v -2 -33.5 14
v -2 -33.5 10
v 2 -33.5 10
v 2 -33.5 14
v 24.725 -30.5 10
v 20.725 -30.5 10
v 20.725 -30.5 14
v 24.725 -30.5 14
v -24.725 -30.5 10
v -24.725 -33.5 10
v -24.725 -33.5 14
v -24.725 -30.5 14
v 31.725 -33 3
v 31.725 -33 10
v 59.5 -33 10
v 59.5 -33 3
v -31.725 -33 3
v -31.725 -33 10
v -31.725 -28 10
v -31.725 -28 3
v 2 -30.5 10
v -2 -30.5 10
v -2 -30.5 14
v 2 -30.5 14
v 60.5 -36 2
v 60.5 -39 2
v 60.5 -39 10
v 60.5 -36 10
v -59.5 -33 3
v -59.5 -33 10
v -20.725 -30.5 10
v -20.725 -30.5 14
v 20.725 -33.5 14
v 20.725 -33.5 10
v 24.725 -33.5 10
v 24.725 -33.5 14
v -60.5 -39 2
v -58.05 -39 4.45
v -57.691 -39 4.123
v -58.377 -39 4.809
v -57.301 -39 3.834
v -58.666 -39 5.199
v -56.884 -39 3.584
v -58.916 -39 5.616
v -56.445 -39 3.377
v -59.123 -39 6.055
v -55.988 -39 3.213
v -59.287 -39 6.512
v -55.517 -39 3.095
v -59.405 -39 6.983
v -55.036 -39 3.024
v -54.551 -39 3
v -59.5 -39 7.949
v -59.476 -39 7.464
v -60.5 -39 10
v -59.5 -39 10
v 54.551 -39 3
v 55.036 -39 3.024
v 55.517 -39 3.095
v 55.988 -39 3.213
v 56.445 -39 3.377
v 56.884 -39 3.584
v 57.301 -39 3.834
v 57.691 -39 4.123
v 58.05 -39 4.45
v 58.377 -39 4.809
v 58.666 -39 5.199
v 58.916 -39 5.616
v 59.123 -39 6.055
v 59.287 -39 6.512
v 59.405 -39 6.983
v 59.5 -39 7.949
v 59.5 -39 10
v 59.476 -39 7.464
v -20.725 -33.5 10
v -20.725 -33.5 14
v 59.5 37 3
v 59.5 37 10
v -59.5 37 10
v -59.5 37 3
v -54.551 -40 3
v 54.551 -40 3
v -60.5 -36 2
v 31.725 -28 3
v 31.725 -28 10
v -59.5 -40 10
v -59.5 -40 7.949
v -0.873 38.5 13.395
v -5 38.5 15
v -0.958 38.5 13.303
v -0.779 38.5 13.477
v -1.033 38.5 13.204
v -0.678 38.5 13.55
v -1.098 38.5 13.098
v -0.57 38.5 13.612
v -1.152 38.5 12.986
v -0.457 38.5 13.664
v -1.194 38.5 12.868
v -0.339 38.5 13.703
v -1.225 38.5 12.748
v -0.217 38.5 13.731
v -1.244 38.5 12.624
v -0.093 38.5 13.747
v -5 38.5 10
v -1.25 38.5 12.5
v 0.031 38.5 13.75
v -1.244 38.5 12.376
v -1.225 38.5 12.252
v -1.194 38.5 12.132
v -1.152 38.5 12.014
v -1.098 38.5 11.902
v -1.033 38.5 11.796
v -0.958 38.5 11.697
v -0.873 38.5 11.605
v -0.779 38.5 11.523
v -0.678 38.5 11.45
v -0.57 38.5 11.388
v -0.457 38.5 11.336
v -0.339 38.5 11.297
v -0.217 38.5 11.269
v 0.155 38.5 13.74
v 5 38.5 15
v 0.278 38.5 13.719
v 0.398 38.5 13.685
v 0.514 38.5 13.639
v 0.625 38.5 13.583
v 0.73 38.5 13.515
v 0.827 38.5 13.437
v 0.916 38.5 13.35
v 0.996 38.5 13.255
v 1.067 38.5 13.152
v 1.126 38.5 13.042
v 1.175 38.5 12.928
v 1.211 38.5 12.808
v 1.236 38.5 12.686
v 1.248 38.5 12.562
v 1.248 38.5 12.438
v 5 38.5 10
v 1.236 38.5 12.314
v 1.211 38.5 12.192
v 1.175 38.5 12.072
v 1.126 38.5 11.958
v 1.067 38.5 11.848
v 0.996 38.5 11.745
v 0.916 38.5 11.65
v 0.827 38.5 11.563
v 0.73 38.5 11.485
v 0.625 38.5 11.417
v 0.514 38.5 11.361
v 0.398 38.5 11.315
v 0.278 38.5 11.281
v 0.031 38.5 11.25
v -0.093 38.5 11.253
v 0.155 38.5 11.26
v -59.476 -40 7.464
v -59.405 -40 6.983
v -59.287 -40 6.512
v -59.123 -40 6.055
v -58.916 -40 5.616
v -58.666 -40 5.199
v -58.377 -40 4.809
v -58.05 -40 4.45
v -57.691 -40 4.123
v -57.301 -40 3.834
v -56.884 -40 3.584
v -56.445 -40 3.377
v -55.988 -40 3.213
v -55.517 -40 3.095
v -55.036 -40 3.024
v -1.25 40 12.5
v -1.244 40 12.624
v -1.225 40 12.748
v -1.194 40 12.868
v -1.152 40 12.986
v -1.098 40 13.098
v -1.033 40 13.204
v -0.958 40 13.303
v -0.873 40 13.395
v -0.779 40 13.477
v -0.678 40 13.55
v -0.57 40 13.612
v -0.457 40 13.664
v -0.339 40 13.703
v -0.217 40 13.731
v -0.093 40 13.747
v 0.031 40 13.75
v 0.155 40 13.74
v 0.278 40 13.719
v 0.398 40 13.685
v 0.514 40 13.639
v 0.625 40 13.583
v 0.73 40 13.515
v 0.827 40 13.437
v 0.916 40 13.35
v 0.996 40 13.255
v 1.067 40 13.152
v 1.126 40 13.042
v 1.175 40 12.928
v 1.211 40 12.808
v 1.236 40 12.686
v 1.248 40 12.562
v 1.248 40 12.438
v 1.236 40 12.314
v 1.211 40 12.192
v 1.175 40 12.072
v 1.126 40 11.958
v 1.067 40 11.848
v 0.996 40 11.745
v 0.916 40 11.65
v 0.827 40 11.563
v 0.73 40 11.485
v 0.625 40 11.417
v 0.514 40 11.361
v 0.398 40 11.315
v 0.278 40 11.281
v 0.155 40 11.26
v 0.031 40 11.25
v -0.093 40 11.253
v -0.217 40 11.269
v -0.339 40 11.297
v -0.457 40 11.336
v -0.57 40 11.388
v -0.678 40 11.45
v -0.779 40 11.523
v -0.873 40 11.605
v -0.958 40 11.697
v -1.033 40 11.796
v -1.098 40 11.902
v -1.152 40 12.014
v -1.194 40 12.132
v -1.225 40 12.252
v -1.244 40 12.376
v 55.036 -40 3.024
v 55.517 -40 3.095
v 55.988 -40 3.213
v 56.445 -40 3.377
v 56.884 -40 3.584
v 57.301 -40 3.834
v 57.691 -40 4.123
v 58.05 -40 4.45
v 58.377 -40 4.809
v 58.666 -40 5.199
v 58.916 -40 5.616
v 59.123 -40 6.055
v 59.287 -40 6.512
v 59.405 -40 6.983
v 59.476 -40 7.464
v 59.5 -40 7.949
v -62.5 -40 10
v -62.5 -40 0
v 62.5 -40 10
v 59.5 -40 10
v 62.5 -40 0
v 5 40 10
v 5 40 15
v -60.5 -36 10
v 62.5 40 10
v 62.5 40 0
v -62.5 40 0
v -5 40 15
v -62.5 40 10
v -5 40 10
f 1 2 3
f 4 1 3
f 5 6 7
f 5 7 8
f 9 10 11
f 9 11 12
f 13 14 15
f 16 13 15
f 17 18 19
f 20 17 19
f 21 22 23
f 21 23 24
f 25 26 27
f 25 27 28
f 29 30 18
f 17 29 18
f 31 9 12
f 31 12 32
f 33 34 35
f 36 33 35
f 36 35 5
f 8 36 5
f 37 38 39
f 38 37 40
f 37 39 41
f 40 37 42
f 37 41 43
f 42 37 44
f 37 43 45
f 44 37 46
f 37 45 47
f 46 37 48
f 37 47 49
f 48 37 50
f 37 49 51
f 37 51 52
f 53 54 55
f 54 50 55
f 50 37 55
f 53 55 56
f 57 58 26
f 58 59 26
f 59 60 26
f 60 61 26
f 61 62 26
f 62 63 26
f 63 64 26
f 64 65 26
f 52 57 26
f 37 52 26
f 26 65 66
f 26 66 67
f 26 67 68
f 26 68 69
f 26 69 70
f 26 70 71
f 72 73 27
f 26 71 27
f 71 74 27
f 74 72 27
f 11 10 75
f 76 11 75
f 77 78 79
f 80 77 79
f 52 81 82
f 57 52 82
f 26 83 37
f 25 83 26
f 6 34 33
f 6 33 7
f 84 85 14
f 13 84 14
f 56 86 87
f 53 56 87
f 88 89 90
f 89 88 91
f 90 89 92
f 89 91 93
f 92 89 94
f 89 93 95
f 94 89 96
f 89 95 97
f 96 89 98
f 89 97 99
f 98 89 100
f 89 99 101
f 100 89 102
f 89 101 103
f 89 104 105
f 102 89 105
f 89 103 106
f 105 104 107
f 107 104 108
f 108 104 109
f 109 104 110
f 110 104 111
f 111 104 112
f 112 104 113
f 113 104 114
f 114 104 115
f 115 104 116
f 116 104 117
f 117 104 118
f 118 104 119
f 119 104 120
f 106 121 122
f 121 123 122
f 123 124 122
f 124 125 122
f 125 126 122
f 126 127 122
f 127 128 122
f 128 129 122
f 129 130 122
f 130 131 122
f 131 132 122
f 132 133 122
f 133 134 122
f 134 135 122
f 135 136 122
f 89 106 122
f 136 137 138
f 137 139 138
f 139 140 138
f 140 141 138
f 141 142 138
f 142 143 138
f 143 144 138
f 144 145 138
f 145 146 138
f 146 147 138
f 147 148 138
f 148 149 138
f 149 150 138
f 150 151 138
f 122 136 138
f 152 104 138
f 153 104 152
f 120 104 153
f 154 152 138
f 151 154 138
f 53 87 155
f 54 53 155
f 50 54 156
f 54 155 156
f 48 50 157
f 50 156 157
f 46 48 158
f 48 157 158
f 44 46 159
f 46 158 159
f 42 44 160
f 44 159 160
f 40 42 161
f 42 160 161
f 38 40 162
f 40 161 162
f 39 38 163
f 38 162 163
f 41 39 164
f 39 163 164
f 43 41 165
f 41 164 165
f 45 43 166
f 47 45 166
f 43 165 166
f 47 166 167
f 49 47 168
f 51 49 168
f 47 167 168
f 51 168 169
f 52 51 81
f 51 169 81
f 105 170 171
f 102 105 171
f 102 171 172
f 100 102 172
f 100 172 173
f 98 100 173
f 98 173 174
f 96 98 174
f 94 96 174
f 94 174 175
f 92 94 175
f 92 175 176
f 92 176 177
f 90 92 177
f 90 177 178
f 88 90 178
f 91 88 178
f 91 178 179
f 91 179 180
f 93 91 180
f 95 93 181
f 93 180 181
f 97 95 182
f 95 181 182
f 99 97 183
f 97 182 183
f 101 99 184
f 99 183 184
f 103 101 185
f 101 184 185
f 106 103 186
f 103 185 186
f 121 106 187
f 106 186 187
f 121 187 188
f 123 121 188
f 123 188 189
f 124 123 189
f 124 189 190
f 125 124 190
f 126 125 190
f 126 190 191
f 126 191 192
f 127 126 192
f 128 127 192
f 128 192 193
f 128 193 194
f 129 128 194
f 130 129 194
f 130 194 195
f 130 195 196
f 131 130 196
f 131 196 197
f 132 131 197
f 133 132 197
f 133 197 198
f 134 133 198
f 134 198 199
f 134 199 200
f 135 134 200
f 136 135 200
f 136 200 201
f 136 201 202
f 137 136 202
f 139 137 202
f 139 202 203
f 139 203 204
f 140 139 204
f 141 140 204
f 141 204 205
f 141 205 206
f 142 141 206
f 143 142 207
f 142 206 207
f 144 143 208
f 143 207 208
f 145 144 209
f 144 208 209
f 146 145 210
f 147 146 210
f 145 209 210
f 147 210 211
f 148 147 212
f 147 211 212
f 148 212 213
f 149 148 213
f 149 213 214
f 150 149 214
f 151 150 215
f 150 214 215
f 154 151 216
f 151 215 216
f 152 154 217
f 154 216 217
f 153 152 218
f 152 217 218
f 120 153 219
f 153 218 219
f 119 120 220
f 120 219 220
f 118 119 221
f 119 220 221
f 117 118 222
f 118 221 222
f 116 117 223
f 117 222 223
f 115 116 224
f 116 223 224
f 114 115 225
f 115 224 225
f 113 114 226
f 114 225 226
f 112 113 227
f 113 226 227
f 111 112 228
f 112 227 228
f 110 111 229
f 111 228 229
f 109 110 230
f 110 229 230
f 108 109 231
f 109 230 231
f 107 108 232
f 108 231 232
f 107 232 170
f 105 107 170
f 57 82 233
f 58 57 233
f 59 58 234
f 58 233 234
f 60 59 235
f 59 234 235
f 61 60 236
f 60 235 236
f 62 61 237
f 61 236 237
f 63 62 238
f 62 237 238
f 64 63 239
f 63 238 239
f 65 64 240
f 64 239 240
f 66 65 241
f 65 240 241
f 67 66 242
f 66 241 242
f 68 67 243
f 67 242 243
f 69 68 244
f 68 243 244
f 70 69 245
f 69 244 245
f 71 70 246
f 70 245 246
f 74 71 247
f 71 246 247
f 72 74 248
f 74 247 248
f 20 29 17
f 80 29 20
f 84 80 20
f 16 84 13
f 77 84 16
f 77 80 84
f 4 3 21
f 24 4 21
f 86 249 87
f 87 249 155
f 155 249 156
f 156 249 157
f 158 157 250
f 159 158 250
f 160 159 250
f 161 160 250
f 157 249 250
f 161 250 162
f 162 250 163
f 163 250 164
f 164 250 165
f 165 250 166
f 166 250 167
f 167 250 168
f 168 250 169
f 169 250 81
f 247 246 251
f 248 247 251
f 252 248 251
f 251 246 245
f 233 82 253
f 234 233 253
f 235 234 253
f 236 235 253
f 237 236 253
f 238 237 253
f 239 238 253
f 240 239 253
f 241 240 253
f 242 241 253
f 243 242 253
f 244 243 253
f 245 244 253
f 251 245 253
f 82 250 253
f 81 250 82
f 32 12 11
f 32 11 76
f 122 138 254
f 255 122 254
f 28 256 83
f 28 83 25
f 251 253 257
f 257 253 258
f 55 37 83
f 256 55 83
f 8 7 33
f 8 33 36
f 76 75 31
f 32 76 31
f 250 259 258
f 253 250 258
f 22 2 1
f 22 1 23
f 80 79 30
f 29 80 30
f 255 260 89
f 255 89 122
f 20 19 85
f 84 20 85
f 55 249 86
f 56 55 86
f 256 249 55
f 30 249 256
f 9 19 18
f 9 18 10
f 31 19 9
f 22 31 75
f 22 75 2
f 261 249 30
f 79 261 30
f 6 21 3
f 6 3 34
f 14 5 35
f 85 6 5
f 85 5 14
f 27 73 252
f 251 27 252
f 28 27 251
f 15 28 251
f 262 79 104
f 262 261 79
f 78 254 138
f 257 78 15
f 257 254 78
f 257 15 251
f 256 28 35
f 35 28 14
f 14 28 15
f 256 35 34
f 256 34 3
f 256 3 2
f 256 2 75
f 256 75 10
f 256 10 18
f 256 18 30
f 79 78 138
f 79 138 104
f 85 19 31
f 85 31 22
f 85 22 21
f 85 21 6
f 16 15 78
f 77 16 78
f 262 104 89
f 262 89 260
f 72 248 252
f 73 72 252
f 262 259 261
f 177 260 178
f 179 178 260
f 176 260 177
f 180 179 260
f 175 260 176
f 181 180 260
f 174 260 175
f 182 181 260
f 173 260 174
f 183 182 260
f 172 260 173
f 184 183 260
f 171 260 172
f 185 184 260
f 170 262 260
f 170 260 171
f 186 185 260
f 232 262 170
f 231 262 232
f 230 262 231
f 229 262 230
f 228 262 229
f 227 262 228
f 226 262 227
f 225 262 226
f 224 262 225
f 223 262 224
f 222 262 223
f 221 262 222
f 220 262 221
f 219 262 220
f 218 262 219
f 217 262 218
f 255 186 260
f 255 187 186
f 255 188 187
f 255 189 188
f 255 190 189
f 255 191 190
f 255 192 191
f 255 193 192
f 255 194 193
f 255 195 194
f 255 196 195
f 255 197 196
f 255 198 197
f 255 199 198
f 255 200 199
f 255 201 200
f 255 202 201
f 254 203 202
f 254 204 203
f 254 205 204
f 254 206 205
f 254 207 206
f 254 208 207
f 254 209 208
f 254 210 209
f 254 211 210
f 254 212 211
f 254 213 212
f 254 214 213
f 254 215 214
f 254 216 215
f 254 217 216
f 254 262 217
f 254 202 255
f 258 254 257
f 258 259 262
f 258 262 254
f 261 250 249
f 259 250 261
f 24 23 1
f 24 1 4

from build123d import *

# Parameters (mm, degrees)
F0_W      = 125
F0_H      = 80
F1_DEPTH  = 10
F3_DEPTH  = 7
F4_W      = 10
F4_H      = 1.5
F5_DEPTH  = 5
F6_R      = 1.25
F7_DEPTH  = 25
F8_W      = 4
F8_H      = 3
F9_DEPTH  = 4
F11_DEPTH = 4
F12_W     = 121
F12_H     = 3
F13_DEPTH = 8


with BuildPart() as f1:
    # F0 (on Top) → F1 (new body)
    with BuildSketch(Plane.XY):
        Rectangle(F0_W, F0_H)
    extrude(amount=F1_DEPTH)

    # F2 (on face) → F3 (cut)
    with BuildSketch(Plane.XY.offset(10)):
        Polygon((59.5, 37), (-59.5, 37), (-59.5, -33), (-31.725, -33), (-31.725, -28), (31.725, -28), (31.725, -33), (59.5, -33), align=None)
    extrude(amount=-F3_DEPTH, mode=Mode.SUBTRACT)

    # F4 (on face) → F5 (join)
    with BuildSketch(Plane.XY.offset(10)):
        with Locations((0, 39.25)):
            Rectangle(F4_W, F4_H)
    extrude(amount=F5_DEPTH)

    # F6 (on face) → F7 (cut)
    with BuildSketch(Plane(origin=(0, 40, 0), x_dir=(-1, 0, 0), z_dir=(0, 1, 0))):
        with Locations((0, 12.5)):
            Circle(F6_R)
    extrude(amount=-F7_DEPTH, mode=Mode.SUBTRACT)

    # F8 (on face) → F9 (join)
    with BuildSketch(Plane.XY.offset(10)):
        with Locations((0, -32)):
            Rectangle(F8_W, F8_H)
        with Locations((22.725, -32)):
            Rectangle(F8_W, F8_H)
        with Locations((-22.725, -32)):
            Rectangle(F8_W, F8_H)
    extrude(amount=F9_DEPTH)

    # F10 (on face) → F11 (cut)
    with BuildSketch(Plane.XZ.offset(40)):
        with BuildLine():
            ThreePointArc((54.551, 3), (58.050471, 4.449529), (59.5, 7.949))
            Line((59.5, 7.949), (59.5, 10))
            Line((59.5, 10), (0, 10))
            Line((0, 10), (-59.5, 10))
            Line((-59.5, 10), (-59.5, 7.949))
            ThreePointArc((-59.5, 7.949), (-58.050471, 4.449529), (-54.551, 3))
            Line((-54.551, 3), (0, 3))
            Line((0, 3), (54.551, 3))
        make_face()
    extrude(amount=-F11_DEPTH, mode=Mode.SUBTRACT)

    # F12 (on face) → F13 (cut)
    with BuildSketch(Plane.XY.offset(10)):
        with Locations((0, -37.5)):
            Rectangle(F12_W, F12_H)
    extrude(amount=-F13_DEPTH, mode=Mode.SUBTRACT)


solid = f1.part
